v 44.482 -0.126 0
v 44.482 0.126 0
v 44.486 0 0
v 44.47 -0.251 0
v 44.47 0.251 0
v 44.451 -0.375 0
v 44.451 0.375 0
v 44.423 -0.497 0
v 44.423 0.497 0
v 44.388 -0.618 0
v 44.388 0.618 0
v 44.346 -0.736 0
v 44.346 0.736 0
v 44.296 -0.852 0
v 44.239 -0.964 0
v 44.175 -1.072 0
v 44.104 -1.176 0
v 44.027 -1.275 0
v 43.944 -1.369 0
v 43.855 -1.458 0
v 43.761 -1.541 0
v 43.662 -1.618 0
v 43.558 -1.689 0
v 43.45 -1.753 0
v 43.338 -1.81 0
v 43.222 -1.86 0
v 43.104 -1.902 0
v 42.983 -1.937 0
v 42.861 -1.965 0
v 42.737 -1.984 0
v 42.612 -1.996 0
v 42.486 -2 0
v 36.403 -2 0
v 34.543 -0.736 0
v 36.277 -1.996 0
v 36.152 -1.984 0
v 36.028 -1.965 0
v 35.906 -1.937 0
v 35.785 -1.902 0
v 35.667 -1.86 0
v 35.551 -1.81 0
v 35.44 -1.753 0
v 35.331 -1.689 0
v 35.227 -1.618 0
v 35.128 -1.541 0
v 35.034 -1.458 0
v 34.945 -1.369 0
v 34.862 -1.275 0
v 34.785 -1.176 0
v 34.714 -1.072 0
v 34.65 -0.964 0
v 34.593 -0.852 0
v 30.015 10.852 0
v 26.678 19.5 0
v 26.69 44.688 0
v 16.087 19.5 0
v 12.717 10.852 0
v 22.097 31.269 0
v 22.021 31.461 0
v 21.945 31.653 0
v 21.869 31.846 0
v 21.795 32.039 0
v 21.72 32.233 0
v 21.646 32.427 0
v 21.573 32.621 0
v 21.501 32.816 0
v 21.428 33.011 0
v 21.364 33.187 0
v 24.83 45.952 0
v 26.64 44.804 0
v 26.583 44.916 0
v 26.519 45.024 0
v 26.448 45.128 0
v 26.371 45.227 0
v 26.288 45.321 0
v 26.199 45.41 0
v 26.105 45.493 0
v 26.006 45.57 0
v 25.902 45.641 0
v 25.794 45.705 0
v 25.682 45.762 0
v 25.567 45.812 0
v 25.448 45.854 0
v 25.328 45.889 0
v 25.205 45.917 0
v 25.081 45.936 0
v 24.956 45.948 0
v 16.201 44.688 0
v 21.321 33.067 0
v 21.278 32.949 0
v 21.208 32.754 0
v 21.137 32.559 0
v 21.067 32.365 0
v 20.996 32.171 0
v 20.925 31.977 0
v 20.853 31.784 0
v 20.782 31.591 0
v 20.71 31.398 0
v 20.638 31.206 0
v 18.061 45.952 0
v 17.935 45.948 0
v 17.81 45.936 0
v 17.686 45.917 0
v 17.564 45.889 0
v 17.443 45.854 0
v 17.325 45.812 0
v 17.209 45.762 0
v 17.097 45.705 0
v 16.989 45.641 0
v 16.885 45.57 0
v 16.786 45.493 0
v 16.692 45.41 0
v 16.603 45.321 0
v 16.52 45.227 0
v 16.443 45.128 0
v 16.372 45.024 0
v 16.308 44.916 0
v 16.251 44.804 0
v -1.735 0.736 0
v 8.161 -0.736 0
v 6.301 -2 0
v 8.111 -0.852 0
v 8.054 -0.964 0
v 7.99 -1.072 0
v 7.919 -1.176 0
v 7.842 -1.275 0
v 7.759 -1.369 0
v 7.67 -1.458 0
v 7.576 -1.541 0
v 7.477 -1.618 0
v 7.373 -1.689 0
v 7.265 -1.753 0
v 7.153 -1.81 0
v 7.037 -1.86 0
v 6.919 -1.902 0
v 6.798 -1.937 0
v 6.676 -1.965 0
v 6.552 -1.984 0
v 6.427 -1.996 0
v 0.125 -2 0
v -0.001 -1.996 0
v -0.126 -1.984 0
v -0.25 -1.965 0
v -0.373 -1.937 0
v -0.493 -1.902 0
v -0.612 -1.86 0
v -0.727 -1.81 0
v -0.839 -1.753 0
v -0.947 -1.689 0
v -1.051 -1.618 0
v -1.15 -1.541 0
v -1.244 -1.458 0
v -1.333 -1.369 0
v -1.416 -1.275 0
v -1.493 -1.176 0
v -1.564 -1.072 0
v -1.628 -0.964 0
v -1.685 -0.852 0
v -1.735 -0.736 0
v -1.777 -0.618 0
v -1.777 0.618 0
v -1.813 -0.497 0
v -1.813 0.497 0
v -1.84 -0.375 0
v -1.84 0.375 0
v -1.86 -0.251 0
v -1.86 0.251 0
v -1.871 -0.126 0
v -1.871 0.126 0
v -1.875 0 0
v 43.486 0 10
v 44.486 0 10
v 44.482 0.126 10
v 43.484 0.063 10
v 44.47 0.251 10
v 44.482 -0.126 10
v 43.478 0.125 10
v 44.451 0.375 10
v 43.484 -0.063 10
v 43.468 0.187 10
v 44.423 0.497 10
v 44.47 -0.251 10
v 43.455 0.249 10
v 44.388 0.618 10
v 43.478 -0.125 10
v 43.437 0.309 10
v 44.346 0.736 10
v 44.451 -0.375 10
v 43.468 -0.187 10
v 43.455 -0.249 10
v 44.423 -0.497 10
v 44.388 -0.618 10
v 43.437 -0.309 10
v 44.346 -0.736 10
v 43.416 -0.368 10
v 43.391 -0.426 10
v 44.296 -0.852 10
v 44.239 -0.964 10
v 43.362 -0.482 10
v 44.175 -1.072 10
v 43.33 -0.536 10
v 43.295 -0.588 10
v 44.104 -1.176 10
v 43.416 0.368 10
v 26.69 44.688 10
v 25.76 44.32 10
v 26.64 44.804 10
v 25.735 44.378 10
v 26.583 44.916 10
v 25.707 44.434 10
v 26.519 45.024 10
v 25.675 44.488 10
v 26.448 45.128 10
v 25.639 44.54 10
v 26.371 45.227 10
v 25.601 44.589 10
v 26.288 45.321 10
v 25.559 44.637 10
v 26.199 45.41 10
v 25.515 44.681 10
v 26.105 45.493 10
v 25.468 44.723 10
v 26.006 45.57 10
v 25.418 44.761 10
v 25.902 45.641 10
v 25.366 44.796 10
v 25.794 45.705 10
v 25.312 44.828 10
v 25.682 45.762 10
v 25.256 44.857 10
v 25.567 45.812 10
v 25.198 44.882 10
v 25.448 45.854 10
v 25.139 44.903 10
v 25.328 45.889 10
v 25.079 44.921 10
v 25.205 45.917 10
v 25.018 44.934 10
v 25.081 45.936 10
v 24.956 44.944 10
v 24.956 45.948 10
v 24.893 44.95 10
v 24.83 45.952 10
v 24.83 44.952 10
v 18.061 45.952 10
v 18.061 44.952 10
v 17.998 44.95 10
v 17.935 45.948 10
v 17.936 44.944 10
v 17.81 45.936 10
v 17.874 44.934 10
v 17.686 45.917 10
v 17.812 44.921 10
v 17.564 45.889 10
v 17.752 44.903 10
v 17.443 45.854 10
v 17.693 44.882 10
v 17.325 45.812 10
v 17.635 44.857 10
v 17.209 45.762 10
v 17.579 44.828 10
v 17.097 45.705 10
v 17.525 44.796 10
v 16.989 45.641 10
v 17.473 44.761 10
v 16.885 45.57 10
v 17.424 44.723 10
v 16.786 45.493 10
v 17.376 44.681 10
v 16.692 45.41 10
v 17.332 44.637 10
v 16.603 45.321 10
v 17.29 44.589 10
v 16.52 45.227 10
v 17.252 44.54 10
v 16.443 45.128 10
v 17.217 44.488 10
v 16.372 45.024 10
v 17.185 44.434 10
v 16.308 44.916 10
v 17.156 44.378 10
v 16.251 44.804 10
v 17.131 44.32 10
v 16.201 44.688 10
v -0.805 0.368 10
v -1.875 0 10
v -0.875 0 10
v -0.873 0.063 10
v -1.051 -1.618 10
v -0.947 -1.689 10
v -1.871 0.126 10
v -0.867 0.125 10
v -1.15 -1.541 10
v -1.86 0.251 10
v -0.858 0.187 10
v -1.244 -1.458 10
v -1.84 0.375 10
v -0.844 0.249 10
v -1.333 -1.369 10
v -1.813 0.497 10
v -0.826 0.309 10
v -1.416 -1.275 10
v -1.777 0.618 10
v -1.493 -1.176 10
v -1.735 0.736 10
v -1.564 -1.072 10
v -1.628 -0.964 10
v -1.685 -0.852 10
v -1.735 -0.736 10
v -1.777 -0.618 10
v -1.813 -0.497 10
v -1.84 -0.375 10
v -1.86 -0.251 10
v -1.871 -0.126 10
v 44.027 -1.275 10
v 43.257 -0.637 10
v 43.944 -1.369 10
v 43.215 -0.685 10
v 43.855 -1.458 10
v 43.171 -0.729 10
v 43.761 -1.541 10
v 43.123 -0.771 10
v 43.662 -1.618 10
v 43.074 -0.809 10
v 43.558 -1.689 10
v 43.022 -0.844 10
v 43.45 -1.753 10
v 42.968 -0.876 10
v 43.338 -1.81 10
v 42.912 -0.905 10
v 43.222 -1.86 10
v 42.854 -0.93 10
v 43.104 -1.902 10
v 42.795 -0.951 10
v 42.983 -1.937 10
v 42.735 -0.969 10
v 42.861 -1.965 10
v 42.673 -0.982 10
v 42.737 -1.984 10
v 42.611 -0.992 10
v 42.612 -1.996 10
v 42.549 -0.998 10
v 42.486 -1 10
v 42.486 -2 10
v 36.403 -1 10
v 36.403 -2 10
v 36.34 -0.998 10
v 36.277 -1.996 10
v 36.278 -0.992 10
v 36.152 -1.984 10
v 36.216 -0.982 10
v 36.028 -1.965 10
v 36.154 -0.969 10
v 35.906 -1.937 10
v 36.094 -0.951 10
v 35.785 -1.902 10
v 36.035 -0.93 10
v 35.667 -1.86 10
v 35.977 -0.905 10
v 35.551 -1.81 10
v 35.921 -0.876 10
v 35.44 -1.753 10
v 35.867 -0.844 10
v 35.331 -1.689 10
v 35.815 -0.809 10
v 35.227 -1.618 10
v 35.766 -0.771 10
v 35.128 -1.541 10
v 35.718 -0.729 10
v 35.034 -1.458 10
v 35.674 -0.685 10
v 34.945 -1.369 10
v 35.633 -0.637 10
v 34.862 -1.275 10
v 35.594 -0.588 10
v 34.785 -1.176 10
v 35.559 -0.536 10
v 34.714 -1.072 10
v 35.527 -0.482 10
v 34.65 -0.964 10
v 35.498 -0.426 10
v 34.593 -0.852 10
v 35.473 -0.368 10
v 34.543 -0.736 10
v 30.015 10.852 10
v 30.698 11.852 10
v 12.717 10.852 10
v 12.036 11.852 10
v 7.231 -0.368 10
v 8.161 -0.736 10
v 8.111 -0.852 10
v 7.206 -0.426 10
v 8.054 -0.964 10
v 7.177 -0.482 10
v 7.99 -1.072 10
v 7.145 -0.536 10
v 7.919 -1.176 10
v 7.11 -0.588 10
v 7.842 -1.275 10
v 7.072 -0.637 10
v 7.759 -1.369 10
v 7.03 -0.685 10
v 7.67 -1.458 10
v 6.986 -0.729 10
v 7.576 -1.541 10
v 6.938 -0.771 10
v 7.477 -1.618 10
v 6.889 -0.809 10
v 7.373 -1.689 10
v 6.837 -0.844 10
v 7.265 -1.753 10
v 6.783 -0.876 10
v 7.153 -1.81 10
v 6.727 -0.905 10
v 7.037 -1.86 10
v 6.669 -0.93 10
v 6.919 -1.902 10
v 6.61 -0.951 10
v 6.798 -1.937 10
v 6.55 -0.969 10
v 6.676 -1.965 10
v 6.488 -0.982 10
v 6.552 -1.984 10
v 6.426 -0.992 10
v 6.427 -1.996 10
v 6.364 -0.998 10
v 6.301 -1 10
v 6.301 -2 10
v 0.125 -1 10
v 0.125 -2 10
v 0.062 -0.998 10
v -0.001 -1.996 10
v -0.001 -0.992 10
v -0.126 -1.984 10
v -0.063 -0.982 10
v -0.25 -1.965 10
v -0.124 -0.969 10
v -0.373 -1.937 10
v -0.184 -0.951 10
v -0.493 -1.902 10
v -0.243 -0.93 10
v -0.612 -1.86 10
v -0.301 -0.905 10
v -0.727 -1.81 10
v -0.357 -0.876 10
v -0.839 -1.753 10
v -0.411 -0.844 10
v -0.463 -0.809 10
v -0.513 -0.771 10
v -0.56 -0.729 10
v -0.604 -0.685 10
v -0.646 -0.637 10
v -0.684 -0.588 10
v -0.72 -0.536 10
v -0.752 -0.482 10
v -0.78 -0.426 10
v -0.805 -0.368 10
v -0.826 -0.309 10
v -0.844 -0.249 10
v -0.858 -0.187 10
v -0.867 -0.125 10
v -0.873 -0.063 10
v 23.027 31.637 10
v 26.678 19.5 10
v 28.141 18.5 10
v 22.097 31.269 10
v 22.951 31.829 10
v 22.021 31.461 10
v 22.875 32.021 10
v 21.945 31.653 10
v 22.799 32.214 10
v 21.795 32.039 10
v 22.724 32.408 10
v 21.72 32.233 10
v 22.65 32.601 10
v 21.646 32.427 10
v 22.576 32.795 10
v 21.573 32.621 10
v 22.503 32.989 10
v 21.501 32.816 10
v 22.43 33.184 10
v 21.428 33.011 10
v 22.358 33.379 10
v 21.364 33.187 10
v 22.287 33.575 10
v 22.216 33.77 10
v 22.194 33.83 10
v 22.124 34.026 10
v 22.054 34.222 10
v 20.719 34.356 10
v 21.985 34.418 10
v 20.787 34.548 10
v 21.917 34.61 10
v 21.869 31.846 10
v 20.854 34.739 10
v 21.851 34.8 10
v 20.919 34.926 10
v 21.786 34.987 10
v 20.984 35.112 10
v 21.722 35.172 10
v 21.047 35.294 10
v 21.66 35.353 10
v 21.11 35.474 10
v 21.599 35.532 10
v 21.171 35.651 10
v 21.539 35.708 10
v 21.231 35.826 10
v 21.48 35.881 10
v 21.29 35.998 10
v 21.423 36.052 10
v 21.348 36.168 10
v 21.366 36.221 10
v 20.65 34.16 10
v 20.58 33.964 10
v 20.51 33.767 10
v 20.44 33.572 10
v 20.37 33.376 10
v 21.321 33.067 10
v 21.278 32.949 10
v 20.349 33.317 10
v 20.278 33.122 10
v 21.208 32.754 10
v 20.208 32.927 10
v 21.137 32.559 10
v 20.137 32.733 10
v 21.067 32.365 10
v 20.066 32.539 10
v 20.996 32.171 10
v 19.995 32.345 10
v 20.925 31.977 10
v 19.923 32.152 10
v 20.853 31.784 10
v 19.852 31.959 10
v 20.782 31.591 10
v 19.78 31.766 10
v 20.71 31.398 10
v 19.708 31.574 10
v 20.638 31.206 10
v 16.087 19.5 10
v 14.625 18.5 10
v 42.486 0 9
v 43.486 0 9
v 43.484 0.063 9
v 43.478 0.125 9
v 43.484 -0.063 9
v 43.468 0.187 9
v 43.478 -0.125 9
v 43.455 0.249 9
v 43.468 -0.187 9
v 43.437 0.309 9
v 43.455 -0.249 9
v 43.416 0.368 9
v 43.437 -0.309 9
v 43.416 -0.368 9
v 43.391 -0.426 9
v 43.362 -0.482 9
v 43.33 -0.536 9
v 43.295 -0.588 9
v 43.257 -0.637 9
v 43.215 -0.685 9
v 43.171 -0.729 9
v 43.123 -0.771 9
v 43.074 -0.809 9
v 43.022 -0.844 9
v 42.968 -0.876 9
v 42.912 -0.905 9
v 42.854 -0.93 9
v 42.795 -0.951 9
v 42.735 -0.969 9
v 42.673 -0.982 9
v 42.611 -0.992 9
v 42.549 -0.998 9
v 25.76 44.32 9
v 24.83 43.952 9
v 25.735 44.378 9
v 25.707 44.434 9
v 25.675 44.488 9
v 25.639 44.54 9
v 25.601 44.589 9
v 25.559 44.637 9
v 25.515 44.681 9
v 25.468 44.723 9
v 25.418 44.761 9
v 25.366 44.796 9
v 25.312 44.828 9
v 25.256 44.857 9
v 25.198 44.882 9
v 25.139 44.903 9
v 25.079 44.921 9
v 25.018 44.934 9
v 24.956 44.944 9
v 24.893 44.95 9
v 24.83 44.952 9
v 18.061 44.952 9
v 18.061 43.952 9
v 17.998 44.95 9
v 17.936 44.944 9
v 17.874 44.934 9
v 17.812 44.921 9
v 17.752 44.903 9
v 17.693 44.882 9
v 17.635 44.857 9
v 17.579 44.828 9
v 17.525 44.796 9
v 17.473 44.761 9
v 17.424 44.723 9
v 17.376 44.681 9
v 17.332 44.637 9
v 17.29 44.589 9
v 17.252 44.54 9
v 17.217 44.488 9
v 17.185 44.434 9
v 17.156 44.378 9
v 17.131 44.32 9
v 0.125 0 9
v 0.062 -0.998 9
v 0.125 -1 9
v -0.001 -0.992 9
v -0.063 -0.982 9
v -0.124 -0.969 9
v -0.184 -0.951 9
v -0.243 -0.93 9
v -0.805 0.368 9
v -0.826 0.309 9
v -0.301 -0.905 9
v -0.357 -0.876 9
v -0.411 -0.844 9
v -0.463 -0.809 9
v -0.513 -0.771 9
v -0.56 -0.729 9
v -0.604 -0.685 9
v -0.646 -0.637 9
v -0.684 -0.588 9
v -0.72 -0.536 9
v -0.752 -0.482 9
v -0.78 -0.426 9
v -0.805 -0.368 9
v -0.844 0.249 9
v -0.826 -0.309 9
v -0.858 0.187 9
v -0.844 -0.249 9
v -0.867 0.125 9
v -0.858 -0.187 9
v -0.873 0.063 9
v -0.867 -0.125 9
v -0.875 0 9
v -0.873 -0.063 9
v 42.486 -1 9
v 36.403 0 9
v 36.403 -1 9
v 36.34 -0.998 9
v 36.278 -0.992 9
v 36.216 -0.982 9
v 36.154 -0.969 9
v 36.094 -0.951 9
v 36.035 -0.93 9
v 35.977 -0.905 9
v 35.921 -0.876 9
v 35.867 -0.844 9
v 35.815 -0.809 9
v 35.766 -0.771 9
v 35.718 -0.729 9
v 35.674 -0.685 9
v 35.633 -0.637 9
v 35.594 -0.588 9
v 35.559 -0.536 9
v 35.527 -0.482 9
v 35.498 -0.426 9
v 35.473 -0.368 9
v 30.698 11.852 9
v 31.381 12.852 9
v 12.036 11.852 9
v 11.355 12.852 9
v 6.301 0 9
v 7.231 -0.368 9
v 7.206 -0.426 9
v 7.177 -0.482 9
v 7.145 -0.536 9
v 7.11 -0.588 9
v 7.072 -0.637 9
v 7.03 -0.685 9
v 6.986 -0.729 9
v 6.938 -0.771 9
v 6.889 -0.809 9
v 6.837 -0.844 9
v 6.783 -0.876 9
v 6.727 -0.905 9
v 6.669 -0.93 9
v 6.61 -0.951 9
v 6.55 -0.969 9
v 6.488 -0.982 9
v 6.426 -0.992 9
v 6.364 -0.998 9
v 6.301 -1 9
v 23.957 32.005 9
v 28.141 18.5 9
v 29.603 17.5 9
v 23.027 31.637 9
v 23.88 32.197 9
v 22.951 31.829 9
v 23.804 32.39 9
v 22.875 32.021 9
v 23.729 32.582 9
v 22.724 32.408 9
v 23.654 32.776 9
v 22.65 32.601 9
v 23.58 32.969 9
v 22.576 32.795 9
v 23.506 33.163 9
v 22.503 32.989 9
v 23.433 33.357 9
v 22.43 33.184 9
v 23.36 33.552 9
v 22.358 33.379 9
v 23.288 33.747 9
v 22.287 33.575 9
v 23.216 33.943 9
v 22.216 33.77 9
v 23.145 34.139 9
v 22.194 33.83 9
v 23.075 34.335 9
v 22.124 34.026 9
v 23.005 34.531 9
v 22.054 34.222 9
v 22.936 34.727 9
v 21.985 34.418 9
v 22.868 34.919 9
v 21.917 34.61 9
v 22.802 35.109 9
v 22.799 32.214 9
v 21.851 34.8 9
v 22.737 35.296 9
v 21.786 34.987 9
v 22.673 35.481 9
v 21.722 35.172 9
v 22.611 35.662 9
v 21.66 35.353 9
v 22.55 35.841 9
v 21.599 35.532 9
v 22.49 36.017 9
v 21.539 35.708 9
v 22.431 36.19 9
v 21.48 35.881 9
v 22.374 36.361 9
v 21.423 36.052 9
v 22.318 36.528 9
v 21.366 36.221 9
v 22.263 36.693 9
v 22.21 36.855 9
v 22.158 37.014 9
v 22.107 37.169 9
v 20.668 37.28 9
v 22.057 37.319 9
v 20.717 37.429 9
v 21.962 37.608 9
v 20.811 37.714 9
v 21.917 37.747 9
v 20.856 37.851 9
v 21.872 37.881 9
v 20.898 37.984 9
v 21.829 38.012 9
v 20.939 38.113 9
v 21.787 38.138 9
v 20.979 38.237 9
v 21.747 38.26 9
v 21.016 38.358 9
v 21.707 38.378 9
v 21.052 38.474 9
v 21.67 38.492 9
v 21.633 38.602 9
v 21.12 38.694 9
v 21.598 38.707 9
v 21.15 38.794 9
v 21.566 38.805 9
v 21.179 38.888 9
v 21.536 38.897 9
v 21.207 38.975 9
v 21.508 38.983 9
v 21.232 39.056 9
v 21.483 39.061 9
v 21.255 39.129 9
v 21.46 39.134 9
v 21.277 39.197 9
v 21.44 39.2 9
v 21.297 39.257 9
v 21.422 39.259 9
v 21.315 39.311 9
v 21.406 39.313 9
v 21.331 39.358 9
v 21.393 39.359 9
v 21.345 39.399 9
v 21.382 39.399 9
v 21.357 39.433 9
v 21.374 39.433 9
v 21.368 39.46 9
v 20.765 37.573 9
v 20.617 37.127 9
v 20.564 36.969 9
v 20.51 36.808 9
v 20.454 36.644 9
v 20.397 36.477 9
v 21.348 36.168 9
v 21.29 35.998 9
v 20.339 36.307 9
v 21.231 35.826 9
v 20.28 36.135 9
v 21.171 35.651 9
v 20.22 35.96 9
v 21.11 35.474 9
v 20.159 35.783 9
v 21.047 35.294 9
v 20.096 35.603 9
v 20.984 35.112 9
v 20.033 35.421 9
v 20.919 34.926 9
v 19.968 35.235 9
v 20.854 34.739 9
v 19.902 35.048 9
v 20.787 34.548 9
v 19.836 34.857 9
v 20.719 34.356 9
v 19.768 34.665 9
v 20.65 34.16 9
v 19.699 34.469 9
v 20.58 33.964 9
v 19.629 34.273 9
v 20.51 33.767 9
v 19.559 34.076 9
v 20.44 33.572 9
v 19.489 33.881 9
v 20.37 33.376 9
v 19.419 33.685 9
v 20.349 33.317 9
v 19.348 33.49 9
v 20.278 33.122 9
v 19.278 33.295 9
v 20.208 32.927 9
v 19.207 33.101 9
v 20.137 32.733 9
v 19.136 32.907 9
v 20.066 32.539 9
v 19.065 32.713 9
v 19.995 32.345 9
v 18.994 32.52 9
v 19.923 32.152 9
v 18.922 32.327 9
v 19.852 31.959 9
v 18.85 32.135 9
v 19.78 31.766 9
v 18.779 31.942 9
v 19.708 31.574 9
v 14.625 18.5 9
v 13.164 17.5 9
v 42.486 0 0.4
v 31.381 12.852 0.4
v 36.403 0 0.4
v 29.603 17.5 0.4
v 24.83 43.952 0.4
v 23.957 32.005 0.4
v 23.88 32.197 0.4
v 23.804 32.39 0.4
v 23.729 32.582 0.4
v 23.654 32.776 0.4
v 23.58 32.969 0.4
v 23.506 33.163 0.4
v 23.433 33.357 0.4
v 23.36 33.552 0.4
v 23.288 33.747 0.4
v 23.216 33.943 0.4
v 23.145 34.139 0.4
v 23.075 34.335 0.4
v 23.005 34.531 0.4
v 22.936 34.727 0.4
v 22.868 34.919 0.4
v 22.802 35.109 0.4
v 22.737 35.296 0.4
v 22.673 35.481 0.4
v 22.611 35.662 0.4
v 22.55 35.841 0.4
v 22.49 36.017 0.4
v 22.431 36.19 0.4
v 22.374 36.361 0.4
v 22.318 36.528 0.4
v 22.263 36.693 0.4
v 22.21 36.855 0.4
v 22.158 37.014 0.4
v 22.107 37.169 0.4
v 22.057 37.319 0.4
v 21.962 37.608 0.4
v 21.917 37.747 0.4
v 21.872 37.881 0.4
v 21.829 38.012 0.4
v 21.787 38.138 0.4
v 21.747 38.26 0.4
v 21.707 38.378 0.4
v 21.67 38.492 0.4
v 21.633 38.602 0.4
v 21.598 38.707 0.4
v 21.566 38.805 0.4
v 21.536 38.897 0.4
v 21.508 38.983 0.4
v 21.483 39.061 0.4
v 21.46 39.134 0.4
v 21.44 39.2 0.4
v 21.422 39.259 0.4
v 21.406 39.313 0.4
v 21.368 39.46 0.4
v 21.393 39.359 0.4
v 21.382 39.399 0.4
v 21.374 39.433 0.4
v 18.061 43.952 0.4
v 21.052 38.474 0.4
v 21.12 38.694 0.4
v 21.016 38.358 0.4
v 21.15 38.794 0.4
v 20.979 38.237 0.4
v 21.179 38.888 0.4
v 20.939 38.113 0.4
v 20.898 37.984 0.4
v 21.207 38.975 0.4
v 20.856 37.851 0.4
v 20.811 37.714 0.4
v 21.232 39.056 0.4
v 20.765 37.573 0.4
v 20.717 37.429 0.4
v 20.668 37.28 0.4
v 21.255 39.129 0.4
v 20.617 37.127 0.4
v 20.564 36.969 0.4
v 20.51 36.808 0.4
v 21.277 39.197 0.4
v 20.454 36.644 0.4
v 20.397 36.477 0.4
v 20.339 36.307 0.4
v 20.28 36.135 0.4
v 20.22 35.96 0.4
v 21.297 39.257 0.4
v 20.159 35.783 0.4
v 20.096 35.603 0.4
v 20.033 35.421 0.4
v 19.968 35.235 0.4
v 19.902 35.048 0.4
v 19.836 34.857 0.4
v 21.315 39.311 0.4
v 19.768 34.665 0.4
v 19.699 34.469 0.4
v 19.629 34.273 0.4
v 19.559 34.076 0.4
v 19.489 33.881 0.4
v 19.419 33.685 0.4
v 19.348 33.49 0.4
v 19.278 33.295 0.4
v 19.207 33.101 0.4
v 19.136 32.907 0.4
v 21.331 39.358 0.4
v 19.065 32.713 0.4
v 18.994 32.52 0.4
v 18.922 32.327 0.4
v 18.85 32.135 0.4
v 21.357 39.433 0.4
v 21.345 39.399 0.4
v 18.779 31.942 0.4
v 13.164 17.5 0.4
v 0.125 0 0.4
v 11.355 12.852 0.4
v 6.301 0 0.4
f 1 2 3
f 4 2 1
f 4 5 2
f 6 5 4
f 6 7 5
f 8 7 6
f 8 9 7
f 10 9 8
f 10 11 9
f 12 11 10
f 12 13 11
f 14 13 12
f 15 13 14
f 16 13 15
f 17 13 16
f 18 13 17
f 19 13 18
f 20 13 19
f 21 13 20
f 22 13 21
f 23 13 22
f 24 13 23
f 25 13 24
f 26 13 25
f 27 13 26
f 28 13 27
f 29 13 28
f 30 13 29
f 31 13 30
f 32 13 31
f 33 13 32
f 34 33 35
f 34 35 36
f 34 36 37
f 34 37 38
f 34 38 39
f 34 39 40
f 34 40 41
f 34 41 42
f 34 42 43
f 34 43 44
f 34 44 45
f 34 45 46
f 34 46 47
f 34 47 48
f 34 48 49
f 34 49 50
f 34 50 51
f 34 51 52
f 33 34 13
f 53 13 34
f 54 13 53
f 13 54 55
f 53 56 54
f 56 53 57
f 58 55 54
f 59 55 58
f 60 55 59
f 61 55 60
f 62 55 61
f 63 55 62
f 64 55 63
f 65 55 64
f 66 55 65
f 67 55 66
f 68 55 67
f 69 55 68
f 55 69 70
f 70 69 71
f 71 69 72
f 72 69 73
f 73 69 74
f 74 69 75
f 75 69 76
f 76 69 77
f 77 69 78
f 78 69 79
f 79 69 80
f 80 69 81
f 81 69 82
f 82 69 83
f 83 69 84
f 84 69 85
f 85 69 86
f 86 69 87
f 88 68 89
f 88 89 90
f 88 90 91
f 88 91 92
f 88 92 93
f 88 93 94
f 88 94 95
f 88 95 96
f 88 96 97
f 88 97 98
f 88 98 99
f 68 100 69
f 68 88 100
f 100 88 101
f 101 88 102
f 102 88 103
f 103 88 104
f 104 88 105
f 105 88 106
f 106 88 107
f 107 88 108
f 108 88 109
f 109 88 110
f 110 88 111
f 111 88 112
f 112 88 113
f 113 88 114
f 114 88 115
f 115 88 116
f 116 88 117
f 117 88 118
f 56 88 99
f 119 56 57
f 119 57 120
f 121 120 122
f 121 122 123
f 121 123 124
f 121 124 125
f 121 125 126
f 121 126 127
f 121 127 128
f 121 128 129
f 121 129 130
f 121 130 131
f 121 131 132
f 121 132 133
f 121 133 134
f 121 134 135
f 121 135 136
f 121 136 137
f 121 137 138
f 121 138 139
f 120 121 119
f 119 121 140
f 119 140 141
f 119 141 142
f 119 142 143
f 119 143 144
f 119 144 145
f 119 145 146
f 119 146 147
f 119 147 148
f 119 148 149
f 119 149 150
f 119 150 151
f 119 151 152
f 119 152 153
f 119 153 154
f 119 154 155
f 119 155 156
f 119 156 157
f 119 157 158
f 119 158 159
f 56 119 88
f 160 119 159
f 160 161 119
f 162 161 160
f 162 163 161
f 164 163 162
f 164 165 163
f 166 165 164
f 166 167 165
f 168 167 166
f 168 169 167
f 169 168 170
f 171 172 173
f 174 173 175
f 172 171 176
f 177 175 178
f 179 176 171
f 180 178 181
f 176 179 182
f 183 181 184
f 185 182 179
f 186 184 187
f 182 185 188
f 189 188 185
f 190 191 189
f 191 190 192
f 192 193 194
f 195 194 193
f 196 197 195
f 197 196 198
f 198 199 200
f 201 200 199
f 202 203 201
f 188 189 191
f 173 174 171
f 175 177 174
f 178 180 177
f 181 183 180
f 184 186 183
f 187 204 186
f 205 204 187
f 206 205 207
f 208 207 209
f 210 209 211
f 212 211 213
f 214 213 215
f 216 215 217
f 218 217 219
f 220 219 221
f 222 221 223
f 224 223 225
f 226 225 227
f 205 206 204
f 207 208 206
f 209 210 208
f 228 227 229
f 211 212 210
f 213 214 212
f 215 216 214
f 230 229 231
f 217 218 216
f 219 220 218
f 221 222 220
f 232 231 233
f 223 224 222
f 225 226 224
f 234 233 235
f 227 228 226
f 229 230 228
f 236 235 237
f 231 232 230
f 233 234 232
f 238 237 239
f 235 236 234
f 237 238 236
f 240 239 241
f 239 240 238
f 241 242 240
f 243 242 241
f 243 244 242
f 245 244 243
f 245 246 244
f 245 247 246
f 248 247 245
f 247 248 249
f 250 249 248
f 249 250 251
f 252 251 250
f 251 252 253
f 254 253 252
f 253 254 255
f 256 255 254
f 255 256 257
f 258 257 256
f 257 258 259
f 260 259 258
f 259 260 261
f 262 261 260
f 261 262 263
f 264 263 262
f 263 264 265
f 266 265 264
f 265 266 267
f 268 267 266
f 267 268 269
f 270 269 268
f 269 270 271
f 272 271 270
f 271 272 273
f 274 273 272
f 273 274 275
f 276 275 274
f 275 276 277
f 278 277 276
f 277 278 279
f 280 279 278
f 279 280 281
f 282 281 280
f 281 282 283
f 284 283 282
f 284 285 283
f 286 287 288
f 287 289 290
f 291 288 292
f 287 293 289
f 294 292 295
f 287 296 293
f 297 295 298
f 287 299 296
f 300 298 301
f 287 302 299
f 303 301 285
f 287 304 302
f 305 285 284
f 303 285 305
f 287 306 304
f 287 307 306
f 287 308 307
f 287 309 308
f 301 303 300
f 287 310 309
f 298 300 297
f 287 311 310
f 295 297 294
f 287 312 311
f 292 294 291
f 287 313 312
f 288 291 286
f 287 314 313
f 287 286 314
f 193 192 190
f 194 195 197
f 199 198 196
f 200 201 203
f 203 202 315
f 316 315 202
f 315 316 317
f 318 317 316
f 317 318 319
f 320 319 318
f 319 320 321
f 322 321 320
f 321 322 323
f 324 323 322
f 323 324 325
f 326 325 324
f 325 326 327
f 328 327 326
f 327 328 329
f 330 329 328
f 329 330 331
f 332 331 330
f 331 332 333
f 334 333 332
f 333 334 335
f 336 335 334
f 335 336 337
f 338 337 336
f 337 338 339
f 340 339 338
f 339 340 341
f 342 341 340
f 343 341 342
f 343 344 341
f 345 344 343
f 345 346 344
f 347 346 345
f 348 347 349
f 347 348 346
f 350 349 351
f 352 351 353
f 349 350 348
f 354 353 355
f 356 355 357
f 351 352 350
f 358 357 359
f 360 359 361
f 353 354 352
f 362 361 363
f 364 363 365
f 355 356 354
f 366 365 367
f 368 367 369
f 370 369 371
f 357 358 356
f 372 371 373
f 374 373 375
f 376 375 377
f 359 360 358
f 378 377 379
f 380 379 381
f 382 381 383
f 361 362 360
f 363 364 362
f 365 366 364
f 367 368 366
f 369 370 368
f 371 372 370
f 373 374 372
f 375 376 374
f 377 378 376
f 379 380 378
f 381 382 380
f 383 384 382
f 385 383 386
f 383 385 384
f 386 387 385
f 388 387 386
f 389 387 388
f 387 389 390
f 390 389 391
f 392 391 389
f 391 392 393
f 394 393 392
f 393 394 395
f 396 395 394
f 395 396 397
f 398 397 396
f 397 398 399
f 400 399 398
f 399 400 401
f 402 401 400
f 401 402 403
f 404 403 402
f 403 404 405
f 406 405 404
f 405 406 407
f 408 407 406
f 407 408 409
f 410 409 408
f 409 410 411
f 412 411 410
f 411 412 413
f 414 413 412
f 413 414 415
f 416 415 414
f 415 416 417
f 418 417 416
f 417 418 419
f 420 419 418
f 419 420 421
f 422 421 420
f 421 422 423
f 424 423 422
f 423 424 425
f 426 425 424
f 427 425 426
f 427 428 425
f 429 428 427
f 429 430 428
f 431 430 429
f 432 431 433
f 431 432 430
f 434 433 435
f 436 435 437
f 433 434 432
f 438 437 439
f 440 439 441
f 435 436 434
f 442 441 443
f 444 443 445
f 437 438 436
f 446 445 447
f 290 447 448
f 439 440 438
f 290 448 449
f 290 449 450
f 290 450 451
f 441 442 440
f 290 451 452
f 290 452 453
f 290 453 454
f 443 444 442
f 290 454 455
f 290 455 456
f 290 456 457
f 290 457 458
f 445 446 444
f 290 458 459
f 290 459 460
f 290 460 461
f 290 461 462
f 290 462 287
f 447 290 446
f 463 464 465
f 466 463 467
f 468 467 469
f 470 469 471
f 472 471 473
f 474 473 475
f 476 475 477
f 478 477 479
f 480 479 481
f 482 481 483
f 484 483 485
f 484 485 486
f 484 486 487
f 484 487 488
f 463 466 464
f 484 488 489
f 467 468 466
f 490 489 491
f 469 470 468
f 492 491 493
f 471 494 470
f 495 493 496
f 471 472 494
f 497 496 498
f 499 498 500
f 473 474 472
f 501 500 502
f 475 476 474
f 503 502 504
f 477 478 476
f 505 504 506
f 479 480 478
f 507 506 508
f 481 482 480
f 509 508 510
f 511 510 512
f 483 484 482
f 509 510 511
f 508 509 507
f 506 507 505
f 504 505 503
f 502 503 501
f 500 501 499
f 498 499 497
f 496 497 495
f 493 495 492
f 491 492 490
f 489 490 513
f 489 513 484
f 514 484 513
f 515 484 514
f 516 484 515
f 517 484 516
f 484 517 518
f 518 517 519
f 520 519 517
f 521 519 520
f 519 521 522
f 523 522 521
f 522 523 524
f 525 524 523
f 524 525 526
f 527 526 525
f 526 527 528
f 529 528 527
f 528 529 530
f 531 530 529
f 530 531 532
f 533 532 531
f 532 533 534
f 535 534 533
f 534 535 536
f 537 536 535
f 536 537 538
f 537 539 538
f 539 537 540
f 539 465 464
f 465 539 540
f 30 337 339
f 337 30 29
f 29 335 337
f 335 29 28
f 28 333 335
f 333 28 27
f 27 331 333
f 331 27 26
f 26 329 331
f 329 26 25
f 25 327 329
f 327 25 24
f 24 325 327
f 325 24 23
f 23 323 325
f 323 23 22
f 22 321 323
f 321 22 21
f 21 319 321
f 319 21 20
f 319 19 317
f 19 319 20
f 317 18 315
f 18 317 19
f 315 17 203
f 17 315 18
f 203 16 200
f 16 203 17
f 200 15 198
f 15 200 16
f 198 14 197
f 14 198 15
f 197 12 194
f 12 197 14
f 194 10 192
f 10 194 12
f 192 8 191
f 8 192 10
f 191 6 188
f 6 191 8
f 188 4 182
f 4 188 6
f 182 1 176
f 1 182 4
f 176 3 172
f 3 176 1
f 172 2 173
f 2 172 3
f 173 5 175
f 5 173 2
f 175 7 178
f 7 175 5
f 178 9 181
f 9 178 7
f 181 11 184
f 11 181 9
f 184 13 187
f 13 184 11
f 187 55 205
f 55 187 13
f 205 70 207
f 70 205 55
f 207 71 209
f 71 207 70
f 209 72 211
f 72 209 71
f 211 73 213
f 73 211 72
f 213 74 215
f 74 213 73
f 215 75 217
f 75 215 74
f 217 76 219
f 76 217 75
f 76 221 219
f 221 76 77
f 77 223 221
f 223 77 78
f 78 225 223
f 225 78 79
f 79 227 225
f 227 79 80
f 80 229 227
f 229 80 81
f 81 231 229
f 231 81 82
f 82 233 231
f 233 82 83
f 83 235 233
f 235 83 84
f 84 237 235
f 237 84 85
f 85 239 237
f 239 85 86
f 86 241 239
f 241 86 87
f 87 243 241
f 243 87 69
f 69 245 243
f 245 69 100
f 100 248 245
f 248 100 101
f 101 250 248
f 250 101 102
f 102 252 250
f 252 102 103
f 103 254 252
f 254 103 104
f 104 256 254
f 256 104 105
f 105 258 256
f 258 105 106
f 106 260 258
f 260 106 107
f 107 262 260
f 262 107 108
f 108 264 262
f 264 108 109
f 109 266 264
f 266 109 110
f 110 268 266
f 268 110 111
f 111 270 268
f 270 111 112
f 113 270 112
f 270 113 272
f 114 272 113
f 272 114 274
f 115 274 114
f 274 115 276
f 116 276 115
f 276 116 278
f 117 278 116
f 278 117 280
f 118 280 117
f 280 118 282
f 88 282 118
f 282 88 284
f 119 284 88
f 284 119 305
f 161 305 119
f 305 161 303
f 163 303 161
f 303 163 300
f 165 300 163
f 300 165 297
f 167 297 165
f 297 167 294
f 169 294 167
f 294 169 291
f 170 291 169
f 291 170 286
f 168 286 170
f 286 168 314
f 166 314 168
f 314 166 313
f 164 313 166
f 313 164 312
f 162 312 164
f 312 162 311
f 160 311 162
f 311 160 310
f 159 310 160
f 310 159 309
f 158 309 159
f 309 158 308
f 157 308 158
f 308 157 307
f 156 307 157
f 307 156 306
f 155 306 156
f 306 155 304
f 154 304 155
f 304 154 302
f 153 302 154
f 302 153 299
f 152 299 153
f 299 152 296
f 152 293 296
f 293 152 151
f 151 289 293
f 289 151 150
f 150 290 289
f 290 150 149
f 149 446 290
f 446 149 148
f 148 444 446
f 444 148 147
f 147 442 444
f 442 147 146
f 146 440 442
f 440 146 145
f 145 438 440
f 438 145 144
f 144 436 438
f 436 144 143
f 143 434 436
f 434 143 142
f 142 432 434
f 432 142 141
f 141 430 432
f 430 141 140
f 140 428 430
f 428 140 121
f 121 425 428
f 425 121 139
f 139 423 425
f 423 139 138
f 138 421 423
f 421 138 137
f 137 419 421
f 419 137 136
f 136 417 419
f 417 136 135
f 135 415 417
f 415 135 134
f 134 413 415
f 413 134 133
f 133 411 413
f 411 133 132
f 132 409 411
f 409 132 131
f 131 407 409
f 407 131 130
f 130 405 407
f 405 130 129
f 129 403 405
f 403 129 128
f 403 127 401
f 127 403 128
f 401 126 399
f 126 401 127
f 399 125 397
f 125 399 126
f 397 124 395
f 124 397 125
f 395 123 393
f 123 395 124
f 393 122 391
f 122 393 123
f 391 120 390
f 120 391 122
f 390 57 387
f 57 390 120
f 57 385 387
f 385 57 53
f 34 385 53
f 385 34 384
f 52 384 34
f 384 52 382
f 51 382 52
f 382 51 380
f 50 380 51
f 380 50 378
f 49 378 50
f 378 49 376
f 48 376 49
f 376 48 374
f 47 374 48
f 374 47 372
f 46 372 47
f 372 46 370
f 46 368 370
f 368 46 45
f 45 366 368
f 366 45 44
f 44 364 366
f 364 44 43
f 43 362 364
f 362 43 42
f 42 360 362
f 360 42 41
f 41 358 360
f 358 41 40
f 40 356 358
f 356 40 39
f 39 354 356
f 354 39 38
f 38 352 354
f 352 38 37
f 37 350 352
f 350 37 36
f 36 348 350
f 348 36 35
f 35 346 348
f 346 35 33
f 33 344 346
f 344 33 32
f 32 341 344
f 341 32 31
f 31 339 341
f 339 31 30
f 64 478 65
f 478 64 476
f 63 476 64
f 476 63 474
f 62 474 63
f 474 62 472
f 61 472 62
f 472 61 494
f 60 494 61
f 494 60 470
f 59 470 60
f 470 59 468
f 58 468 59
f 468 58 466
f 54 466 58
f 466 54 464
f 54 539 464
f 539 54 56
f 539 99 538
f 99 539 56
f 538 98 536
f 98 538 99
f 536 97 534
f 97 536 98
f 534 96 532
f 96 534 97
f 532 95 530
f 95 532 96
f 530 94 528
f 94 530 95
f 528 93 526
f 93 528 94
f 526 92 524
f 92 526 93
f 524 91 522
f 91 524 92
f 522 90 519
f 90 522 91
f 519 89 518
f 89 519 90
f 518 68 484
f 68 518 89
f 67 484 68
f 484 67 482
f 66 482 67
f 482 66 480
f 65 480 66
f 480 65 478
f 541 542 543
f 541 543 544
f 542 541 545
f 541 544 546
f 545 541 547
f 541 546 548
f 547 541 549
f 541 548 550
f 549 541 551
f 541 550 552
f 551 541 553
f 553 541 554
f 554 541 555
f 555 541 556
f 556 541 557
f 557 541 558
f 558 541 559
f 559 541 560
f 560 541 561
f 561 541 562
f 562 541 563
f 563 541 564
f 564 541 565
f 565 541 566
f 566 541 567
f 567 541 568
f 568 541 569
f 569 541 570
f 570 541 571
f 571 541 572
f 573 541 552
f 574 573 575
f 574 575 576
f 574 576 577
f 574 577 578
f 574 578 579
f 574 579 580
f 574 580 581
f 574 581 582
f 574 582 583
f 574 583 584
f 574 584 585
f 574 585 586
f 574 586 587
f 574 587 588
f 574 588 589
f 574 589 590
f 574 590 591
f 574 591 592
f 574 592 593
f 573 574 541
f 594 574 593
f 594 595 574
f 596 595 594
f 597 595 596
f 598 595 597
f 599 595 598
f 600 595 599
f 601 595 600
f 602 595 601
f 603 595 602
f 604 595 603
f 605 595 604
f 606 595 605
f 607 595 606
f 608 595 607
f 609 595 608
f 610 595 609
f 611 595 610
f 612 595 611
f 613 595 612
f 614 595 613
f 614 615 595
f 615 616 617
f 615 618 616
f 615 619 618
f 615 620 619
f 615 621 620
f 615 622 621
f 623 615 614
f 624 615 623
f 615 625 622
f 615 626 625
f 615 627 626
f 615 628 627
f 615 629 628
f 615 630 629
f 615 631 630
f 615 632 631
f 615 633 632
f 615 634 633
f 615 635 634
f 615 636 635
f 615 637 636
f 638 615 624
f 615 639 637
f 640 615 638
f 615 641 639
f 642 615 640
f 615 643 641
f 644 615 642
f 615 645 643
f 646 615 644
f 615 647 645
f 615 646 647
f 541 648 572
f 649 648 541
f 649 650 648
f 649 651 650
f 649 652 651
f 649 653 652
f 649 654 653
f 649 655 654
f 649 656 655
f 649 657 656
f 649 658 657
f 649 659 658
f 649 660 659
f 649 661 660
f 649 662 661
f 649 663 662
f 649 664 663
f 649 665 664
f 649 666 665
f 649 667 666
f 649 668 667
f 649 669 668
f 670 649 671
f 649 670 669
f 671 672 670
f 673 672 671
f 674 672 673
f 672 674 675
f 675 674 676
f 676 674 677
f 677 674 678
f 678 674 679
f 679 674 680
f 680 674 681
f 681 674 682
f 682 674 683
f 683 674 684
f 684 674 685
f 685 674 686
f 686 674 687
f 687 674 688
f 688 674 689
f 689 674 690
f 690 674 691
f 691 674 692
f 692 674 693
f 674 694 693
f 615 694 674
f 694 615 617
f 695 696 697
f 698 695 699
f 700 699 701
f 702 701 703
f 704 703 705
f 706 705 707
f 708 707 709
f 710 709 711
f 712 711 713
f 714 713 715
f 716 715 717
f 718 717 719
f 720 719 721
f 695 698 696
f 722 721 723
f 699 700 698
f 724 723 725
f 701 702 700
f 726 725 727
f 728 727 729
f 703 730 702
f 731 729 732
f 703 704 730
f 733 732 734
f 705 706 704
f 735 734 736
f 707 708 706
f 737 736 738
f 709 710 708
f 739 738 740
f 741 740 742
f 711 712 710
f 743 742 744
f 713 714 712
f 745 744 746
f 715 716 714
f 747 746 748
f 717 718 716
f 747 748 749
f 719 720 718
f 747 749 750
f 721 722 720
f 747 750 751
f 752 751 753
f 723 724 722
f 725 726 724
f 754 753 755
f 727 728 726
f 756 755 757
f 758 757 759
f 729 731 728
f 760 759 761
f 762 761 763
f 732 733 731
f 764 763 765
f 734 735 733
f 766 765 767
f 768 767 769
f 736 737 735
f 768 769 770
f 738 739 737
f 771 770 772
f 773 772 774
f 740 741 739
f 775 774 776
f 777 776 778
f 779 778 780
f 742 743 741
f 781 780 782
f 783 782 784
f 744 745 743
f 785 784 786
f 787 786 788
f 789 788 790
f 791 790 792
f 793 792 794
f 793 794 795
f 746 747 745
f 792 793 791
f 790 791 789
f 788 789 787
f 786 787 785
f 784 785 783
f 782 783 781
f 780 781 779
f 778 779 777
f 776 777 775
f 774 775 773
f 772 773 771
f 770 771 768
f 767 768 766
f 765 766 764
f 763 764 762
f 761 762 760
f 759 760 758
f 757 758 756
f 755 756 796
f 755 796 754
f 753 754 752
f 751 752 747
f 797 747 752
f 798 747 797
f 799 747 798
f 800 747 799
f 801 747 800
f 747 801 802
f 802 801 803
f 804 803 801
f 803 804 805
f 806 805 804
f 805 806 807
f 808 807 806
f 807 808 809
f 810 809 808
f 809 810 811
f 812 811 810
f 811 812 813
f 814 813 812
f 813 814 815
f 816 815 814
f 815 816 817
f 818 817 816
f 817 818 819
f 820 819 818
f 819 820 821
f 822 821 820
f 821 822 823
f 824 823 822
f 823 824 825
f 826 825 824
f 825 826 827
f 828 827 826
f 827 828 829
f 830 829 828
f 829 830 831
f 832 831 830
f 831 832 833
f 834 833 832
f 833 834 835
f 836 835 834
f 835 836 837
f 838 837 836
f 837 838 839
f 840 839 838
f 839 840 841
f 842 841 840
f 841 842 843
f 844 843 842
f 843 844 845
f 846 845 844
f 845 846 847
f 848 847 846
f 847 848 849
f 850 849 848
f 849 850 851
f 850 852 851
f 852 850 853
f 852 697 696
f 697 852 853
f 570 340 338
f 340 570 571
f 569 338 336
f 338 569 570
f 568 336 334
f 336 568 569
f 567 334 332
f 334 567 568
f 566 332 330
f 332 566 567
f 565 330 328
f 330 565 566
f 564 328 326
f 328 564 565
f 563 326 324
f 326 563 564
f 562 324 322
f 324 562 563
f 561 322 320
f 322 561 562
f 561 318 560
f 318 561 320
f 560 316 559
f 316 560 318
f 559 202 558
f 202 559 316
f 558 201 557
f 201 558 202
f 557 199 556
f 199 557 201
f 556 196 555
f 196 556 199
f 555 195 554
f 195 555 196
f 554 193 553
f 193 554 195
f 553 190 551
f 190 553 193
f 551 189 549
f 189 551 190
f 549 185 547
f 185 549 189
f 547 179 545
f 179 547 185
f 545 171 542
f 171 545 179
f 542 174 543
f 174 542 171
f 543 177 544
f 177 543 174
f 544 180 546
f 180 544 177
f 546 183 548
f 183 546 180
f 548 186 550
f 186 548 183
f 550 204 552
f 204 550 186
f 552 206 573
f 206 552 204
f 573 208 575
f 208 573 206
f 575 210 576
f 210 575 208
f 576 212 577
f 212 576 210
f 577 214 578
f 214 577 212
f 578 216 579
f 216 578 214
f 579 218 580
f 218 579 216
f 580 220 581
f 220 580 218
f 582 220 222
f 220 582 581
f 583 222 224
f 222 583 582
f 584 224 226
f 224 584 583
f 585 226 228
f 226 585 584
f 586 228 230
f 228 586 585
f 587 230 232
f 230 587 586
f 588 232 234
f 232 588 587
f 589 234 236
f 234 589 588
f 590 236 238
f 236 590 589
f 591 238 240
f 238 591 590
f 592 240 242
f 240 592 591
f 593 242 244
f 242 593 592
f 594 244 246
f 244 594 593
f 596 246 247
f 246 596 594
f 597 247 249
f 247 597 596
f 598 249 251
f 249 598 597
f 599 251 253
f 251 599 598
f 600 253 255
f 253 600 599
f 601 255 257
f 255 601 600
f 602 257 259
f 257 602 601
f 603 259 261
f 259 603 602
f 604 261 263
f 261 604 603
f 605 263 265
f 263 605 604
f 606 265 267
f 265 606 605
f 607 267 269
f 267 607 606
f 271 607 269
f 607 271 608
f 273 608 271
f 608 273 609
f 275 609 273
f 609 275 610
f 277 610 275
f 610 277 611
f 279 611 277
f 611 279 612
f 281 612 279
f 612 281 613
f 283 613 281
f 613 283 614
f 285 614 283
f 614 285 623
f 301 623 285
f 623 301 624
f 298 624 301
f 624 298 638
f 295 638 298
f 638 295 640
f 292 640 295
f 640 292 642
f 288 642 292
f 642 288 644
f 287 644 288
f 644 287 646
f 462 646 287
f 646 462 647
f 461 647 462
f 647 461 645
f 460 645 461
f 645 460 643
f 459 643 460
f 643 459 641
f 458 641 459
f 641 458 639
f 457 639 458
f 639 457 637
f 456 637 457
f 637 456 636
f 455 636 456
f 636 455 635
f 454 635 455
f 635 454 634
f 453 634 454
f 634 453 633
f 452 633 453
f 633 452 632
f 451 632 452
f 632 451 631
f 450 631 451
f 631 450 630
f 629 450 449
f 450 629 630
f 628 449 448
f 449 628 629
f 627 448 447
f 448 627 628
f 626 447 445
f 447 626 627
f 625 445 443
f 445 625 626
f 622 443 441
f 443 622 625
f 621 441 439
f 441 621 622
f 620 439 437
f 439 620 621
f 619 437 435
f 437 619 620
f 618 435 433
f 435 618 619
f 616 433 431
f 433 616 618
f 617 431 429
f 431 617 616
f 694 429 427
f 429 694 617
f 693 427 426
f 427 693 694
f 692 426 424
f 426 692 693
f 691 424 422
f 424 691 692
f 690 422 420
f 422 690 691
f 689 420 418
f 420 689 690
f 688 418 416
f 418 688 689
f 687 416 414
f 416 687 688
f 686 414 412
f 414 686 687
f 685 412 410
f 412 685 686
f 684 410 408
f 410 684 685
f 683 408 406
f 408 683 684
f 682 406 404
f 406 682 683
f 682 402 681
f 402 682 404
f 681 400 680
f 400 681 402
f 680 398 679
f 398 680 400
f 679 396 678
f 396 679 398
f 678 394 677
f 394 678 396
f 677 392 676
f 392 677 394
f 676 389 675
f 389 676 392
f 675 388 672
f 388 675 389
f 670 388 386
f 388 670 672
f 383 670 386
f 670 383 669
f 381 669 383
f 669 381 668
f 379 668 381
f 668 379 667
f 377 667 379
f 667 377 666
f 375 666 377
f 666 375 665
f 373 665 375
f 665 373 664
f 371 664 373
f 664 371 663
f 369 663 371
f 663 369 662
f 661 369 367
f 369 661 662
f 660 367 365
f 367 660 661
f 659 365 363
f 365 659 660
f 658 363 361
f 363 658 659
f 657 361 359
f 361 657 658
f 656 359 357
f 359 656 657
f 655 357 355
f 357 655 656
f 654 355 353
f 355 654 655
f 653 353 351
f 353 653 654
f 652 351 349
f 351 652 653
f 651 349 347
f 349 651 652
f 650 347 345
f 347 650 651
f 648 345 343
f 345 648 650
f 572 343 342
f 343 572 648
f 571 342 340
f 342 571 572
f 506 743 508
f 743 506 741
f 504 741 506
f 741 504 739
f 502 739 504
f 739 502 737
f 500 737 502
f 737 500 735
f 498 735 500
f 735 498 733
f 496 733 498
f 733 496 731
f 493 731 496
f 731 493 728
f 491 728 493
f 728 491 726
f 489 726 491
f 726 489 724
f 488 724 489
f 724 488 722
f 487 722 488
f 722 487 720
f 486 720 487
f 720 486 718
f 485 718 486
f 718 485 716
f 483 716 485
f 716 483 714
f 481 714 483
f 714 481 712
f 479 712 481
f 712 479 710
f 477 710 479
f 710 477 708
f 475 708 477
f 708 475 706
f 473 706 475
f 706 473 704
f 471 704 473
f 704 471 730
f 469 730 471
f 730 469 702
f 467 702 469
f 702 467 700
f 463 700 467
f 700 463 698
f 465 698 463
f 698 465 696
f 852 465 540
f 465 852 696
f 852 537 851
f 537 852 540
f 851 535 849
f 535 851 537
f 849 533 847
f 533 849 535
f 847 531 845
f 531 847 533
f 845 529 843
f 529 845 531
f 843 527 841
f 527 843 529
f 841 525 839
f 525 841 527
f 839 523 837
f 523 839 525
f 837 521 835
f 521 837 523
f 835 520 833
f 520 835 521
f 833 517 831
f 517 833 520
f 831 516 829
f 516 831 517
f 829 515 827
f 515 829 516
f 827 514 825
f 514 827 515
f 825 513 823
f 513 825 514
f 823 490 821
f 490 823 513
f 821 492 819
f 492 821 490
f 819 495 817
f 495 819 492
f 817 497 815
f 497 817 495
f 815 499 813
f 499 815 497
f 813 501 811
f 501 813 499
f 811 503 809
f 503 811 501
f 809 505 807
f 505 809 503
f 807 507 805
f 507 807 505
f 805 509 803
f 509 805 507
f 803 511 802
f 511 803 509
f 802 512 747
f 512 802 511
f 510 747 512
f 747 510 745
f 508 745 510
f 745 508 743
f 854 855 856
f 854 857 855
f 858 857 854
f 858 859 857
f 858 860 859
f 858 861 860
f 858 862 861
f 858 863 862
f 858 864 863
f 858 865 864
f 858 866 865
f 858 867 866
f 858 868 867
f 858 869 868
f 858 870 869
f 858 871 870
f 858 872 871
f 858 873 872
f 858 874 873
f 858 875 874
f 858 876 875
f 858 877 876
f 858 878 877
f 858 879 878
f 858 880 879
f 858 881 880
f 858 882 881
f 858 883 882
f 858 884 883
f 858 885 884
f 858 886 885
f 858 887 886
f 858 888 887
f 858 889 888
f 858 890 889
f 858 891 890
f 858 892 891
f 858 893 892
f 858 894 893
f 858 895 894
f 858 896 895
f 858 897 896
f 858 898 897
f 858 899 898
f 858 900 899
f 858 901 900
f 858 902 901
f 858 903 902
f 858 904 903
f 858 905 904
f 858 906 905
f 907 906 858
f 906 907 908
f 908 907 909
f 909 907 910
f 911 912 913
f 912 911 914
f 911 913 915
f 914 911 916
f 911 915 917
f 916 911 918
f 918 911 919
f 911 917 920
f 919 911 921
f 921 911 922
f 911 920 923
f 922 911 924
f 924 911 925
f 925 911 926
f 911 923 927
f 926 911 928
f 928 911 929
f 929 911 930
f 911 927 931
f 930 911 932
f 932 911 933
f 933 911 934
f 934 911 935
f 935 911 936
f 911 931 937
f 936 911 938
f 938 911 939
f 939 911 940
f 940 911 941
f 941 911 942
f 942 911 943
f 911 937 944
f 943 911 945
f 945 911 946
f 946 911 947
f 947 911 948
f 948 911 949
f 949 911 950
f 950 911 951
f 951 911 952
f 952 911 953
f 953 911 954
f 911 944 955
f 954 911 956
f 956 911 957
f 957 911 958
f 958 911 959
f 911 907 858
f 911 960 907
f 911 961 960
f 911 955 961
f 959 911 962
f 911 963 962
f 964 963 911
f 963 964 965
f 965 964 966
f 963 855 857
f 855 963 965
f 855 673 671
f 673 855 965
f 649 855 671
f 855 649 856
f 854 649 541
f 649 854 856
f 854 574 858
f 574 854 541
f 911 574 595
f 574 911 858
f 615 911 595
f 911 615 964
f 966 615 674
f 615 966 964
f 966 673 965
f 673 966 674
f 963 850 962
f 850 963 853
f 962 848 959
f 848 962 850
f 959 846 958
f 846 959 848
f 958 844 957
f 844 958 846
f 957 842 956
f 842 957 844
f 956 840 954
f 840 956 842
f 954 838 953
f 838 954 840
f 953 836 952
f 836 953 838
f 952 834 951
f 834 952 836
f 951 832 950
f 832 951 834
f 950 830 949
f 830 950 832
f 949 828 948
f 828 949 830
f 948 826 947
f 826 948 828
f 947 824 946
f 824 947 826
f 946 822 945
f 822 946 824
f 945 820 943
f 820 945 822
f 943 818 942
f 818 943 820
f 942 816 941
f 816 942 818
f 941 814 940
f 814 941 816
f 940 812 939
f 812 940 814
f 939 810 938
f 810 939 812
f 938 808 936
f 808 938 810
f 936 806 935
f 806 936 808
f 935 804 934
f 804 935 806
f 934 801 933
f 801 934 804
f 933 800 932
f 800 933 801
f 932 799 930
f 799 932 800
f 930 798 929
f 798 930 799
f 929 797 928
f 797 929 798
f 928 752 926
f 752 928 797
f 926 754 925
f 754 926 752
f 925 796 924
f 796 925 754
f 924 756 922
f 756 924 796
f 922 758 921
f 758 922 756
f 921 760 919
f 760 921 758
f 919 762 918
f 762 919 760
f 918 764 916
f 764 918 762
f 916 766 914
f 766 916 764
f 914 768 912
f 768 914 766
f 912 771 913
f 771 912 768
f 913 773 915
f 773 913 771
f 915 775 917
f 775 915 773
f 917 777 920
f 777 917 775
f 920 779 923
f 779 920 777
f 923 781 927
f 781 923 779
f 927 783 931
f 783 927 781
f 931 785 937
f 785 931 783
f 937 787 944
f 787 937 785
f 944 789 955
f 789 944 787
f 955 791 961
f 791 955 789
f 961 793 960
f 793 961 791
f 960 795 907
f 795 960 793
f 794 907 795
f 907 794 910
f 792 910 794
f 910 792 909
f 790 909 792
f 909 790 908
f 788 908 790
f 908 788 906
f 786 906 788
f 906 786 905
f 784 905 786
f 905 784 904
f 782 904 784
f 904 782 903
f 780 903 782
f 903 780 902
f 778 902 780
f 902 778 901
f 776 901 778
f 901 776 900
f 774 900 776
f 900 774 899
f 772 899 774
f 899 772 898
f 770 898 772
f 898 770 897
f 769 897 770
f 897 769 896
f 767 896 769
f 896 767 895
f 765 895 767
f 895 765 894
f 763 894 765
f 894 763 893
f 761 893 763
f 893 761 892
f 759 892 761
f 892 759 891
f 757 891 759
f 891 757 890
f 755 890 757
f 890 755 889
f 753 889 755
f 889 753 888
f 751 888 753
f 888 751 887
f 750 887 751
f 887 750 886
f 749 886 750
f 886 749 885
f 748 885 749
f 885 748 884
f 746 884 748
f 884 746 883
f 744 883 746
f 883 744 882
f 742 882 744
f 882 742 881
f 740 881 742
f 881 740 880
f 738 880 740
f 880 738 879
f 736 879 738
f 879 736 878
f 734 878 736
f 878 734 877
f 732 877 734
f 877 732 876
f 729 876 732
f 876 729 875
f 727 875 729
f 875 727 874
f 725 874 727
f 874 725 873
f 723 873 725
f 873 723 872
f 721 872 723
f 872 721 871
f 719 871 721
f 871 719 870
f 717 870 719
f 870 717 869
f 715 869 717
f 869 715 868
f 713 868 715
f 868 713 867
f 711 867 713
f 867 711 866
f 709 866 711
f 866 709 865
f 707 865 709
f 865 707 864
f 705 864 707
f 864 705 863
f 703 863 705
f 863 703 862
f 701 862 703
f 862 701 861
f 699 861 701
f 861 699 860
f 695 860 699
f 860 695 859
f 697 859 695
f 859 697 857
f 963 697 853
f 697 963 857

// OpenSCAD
// Sign body maker V3 - bigclivedotcom
letter = "A"; // Sign character to make
style = "Arial"; // See "Help" and "Font List"
size = 50; // Size of character (height)
depth = 10; // Depth of sign character
$fn=100; // Curve facets - higher is smoother
walls = 2; // Side wall thickness
base=.4; // Base thickness (-1 for open back)
face = 1; // Face thickness
// Don't change variables below here
sized=size-(2*walls);
difference() {
    linear_extrude(height=depth)
    minkowski() {
        text(letter,sized,style);
        circle(walls);
    }
    // Lip for front face (half wall thickness)
    translate([0,0,depth-face])
    linear_extrude(height=2*face)
    minkowski() {
        text(letter,sized,style);
        circle(walls/2);
    }
    // hollow core of letter
    translate([0,0,base])
    linear_extrude(height=depth+2)
    text(letter,sized,style);
}
